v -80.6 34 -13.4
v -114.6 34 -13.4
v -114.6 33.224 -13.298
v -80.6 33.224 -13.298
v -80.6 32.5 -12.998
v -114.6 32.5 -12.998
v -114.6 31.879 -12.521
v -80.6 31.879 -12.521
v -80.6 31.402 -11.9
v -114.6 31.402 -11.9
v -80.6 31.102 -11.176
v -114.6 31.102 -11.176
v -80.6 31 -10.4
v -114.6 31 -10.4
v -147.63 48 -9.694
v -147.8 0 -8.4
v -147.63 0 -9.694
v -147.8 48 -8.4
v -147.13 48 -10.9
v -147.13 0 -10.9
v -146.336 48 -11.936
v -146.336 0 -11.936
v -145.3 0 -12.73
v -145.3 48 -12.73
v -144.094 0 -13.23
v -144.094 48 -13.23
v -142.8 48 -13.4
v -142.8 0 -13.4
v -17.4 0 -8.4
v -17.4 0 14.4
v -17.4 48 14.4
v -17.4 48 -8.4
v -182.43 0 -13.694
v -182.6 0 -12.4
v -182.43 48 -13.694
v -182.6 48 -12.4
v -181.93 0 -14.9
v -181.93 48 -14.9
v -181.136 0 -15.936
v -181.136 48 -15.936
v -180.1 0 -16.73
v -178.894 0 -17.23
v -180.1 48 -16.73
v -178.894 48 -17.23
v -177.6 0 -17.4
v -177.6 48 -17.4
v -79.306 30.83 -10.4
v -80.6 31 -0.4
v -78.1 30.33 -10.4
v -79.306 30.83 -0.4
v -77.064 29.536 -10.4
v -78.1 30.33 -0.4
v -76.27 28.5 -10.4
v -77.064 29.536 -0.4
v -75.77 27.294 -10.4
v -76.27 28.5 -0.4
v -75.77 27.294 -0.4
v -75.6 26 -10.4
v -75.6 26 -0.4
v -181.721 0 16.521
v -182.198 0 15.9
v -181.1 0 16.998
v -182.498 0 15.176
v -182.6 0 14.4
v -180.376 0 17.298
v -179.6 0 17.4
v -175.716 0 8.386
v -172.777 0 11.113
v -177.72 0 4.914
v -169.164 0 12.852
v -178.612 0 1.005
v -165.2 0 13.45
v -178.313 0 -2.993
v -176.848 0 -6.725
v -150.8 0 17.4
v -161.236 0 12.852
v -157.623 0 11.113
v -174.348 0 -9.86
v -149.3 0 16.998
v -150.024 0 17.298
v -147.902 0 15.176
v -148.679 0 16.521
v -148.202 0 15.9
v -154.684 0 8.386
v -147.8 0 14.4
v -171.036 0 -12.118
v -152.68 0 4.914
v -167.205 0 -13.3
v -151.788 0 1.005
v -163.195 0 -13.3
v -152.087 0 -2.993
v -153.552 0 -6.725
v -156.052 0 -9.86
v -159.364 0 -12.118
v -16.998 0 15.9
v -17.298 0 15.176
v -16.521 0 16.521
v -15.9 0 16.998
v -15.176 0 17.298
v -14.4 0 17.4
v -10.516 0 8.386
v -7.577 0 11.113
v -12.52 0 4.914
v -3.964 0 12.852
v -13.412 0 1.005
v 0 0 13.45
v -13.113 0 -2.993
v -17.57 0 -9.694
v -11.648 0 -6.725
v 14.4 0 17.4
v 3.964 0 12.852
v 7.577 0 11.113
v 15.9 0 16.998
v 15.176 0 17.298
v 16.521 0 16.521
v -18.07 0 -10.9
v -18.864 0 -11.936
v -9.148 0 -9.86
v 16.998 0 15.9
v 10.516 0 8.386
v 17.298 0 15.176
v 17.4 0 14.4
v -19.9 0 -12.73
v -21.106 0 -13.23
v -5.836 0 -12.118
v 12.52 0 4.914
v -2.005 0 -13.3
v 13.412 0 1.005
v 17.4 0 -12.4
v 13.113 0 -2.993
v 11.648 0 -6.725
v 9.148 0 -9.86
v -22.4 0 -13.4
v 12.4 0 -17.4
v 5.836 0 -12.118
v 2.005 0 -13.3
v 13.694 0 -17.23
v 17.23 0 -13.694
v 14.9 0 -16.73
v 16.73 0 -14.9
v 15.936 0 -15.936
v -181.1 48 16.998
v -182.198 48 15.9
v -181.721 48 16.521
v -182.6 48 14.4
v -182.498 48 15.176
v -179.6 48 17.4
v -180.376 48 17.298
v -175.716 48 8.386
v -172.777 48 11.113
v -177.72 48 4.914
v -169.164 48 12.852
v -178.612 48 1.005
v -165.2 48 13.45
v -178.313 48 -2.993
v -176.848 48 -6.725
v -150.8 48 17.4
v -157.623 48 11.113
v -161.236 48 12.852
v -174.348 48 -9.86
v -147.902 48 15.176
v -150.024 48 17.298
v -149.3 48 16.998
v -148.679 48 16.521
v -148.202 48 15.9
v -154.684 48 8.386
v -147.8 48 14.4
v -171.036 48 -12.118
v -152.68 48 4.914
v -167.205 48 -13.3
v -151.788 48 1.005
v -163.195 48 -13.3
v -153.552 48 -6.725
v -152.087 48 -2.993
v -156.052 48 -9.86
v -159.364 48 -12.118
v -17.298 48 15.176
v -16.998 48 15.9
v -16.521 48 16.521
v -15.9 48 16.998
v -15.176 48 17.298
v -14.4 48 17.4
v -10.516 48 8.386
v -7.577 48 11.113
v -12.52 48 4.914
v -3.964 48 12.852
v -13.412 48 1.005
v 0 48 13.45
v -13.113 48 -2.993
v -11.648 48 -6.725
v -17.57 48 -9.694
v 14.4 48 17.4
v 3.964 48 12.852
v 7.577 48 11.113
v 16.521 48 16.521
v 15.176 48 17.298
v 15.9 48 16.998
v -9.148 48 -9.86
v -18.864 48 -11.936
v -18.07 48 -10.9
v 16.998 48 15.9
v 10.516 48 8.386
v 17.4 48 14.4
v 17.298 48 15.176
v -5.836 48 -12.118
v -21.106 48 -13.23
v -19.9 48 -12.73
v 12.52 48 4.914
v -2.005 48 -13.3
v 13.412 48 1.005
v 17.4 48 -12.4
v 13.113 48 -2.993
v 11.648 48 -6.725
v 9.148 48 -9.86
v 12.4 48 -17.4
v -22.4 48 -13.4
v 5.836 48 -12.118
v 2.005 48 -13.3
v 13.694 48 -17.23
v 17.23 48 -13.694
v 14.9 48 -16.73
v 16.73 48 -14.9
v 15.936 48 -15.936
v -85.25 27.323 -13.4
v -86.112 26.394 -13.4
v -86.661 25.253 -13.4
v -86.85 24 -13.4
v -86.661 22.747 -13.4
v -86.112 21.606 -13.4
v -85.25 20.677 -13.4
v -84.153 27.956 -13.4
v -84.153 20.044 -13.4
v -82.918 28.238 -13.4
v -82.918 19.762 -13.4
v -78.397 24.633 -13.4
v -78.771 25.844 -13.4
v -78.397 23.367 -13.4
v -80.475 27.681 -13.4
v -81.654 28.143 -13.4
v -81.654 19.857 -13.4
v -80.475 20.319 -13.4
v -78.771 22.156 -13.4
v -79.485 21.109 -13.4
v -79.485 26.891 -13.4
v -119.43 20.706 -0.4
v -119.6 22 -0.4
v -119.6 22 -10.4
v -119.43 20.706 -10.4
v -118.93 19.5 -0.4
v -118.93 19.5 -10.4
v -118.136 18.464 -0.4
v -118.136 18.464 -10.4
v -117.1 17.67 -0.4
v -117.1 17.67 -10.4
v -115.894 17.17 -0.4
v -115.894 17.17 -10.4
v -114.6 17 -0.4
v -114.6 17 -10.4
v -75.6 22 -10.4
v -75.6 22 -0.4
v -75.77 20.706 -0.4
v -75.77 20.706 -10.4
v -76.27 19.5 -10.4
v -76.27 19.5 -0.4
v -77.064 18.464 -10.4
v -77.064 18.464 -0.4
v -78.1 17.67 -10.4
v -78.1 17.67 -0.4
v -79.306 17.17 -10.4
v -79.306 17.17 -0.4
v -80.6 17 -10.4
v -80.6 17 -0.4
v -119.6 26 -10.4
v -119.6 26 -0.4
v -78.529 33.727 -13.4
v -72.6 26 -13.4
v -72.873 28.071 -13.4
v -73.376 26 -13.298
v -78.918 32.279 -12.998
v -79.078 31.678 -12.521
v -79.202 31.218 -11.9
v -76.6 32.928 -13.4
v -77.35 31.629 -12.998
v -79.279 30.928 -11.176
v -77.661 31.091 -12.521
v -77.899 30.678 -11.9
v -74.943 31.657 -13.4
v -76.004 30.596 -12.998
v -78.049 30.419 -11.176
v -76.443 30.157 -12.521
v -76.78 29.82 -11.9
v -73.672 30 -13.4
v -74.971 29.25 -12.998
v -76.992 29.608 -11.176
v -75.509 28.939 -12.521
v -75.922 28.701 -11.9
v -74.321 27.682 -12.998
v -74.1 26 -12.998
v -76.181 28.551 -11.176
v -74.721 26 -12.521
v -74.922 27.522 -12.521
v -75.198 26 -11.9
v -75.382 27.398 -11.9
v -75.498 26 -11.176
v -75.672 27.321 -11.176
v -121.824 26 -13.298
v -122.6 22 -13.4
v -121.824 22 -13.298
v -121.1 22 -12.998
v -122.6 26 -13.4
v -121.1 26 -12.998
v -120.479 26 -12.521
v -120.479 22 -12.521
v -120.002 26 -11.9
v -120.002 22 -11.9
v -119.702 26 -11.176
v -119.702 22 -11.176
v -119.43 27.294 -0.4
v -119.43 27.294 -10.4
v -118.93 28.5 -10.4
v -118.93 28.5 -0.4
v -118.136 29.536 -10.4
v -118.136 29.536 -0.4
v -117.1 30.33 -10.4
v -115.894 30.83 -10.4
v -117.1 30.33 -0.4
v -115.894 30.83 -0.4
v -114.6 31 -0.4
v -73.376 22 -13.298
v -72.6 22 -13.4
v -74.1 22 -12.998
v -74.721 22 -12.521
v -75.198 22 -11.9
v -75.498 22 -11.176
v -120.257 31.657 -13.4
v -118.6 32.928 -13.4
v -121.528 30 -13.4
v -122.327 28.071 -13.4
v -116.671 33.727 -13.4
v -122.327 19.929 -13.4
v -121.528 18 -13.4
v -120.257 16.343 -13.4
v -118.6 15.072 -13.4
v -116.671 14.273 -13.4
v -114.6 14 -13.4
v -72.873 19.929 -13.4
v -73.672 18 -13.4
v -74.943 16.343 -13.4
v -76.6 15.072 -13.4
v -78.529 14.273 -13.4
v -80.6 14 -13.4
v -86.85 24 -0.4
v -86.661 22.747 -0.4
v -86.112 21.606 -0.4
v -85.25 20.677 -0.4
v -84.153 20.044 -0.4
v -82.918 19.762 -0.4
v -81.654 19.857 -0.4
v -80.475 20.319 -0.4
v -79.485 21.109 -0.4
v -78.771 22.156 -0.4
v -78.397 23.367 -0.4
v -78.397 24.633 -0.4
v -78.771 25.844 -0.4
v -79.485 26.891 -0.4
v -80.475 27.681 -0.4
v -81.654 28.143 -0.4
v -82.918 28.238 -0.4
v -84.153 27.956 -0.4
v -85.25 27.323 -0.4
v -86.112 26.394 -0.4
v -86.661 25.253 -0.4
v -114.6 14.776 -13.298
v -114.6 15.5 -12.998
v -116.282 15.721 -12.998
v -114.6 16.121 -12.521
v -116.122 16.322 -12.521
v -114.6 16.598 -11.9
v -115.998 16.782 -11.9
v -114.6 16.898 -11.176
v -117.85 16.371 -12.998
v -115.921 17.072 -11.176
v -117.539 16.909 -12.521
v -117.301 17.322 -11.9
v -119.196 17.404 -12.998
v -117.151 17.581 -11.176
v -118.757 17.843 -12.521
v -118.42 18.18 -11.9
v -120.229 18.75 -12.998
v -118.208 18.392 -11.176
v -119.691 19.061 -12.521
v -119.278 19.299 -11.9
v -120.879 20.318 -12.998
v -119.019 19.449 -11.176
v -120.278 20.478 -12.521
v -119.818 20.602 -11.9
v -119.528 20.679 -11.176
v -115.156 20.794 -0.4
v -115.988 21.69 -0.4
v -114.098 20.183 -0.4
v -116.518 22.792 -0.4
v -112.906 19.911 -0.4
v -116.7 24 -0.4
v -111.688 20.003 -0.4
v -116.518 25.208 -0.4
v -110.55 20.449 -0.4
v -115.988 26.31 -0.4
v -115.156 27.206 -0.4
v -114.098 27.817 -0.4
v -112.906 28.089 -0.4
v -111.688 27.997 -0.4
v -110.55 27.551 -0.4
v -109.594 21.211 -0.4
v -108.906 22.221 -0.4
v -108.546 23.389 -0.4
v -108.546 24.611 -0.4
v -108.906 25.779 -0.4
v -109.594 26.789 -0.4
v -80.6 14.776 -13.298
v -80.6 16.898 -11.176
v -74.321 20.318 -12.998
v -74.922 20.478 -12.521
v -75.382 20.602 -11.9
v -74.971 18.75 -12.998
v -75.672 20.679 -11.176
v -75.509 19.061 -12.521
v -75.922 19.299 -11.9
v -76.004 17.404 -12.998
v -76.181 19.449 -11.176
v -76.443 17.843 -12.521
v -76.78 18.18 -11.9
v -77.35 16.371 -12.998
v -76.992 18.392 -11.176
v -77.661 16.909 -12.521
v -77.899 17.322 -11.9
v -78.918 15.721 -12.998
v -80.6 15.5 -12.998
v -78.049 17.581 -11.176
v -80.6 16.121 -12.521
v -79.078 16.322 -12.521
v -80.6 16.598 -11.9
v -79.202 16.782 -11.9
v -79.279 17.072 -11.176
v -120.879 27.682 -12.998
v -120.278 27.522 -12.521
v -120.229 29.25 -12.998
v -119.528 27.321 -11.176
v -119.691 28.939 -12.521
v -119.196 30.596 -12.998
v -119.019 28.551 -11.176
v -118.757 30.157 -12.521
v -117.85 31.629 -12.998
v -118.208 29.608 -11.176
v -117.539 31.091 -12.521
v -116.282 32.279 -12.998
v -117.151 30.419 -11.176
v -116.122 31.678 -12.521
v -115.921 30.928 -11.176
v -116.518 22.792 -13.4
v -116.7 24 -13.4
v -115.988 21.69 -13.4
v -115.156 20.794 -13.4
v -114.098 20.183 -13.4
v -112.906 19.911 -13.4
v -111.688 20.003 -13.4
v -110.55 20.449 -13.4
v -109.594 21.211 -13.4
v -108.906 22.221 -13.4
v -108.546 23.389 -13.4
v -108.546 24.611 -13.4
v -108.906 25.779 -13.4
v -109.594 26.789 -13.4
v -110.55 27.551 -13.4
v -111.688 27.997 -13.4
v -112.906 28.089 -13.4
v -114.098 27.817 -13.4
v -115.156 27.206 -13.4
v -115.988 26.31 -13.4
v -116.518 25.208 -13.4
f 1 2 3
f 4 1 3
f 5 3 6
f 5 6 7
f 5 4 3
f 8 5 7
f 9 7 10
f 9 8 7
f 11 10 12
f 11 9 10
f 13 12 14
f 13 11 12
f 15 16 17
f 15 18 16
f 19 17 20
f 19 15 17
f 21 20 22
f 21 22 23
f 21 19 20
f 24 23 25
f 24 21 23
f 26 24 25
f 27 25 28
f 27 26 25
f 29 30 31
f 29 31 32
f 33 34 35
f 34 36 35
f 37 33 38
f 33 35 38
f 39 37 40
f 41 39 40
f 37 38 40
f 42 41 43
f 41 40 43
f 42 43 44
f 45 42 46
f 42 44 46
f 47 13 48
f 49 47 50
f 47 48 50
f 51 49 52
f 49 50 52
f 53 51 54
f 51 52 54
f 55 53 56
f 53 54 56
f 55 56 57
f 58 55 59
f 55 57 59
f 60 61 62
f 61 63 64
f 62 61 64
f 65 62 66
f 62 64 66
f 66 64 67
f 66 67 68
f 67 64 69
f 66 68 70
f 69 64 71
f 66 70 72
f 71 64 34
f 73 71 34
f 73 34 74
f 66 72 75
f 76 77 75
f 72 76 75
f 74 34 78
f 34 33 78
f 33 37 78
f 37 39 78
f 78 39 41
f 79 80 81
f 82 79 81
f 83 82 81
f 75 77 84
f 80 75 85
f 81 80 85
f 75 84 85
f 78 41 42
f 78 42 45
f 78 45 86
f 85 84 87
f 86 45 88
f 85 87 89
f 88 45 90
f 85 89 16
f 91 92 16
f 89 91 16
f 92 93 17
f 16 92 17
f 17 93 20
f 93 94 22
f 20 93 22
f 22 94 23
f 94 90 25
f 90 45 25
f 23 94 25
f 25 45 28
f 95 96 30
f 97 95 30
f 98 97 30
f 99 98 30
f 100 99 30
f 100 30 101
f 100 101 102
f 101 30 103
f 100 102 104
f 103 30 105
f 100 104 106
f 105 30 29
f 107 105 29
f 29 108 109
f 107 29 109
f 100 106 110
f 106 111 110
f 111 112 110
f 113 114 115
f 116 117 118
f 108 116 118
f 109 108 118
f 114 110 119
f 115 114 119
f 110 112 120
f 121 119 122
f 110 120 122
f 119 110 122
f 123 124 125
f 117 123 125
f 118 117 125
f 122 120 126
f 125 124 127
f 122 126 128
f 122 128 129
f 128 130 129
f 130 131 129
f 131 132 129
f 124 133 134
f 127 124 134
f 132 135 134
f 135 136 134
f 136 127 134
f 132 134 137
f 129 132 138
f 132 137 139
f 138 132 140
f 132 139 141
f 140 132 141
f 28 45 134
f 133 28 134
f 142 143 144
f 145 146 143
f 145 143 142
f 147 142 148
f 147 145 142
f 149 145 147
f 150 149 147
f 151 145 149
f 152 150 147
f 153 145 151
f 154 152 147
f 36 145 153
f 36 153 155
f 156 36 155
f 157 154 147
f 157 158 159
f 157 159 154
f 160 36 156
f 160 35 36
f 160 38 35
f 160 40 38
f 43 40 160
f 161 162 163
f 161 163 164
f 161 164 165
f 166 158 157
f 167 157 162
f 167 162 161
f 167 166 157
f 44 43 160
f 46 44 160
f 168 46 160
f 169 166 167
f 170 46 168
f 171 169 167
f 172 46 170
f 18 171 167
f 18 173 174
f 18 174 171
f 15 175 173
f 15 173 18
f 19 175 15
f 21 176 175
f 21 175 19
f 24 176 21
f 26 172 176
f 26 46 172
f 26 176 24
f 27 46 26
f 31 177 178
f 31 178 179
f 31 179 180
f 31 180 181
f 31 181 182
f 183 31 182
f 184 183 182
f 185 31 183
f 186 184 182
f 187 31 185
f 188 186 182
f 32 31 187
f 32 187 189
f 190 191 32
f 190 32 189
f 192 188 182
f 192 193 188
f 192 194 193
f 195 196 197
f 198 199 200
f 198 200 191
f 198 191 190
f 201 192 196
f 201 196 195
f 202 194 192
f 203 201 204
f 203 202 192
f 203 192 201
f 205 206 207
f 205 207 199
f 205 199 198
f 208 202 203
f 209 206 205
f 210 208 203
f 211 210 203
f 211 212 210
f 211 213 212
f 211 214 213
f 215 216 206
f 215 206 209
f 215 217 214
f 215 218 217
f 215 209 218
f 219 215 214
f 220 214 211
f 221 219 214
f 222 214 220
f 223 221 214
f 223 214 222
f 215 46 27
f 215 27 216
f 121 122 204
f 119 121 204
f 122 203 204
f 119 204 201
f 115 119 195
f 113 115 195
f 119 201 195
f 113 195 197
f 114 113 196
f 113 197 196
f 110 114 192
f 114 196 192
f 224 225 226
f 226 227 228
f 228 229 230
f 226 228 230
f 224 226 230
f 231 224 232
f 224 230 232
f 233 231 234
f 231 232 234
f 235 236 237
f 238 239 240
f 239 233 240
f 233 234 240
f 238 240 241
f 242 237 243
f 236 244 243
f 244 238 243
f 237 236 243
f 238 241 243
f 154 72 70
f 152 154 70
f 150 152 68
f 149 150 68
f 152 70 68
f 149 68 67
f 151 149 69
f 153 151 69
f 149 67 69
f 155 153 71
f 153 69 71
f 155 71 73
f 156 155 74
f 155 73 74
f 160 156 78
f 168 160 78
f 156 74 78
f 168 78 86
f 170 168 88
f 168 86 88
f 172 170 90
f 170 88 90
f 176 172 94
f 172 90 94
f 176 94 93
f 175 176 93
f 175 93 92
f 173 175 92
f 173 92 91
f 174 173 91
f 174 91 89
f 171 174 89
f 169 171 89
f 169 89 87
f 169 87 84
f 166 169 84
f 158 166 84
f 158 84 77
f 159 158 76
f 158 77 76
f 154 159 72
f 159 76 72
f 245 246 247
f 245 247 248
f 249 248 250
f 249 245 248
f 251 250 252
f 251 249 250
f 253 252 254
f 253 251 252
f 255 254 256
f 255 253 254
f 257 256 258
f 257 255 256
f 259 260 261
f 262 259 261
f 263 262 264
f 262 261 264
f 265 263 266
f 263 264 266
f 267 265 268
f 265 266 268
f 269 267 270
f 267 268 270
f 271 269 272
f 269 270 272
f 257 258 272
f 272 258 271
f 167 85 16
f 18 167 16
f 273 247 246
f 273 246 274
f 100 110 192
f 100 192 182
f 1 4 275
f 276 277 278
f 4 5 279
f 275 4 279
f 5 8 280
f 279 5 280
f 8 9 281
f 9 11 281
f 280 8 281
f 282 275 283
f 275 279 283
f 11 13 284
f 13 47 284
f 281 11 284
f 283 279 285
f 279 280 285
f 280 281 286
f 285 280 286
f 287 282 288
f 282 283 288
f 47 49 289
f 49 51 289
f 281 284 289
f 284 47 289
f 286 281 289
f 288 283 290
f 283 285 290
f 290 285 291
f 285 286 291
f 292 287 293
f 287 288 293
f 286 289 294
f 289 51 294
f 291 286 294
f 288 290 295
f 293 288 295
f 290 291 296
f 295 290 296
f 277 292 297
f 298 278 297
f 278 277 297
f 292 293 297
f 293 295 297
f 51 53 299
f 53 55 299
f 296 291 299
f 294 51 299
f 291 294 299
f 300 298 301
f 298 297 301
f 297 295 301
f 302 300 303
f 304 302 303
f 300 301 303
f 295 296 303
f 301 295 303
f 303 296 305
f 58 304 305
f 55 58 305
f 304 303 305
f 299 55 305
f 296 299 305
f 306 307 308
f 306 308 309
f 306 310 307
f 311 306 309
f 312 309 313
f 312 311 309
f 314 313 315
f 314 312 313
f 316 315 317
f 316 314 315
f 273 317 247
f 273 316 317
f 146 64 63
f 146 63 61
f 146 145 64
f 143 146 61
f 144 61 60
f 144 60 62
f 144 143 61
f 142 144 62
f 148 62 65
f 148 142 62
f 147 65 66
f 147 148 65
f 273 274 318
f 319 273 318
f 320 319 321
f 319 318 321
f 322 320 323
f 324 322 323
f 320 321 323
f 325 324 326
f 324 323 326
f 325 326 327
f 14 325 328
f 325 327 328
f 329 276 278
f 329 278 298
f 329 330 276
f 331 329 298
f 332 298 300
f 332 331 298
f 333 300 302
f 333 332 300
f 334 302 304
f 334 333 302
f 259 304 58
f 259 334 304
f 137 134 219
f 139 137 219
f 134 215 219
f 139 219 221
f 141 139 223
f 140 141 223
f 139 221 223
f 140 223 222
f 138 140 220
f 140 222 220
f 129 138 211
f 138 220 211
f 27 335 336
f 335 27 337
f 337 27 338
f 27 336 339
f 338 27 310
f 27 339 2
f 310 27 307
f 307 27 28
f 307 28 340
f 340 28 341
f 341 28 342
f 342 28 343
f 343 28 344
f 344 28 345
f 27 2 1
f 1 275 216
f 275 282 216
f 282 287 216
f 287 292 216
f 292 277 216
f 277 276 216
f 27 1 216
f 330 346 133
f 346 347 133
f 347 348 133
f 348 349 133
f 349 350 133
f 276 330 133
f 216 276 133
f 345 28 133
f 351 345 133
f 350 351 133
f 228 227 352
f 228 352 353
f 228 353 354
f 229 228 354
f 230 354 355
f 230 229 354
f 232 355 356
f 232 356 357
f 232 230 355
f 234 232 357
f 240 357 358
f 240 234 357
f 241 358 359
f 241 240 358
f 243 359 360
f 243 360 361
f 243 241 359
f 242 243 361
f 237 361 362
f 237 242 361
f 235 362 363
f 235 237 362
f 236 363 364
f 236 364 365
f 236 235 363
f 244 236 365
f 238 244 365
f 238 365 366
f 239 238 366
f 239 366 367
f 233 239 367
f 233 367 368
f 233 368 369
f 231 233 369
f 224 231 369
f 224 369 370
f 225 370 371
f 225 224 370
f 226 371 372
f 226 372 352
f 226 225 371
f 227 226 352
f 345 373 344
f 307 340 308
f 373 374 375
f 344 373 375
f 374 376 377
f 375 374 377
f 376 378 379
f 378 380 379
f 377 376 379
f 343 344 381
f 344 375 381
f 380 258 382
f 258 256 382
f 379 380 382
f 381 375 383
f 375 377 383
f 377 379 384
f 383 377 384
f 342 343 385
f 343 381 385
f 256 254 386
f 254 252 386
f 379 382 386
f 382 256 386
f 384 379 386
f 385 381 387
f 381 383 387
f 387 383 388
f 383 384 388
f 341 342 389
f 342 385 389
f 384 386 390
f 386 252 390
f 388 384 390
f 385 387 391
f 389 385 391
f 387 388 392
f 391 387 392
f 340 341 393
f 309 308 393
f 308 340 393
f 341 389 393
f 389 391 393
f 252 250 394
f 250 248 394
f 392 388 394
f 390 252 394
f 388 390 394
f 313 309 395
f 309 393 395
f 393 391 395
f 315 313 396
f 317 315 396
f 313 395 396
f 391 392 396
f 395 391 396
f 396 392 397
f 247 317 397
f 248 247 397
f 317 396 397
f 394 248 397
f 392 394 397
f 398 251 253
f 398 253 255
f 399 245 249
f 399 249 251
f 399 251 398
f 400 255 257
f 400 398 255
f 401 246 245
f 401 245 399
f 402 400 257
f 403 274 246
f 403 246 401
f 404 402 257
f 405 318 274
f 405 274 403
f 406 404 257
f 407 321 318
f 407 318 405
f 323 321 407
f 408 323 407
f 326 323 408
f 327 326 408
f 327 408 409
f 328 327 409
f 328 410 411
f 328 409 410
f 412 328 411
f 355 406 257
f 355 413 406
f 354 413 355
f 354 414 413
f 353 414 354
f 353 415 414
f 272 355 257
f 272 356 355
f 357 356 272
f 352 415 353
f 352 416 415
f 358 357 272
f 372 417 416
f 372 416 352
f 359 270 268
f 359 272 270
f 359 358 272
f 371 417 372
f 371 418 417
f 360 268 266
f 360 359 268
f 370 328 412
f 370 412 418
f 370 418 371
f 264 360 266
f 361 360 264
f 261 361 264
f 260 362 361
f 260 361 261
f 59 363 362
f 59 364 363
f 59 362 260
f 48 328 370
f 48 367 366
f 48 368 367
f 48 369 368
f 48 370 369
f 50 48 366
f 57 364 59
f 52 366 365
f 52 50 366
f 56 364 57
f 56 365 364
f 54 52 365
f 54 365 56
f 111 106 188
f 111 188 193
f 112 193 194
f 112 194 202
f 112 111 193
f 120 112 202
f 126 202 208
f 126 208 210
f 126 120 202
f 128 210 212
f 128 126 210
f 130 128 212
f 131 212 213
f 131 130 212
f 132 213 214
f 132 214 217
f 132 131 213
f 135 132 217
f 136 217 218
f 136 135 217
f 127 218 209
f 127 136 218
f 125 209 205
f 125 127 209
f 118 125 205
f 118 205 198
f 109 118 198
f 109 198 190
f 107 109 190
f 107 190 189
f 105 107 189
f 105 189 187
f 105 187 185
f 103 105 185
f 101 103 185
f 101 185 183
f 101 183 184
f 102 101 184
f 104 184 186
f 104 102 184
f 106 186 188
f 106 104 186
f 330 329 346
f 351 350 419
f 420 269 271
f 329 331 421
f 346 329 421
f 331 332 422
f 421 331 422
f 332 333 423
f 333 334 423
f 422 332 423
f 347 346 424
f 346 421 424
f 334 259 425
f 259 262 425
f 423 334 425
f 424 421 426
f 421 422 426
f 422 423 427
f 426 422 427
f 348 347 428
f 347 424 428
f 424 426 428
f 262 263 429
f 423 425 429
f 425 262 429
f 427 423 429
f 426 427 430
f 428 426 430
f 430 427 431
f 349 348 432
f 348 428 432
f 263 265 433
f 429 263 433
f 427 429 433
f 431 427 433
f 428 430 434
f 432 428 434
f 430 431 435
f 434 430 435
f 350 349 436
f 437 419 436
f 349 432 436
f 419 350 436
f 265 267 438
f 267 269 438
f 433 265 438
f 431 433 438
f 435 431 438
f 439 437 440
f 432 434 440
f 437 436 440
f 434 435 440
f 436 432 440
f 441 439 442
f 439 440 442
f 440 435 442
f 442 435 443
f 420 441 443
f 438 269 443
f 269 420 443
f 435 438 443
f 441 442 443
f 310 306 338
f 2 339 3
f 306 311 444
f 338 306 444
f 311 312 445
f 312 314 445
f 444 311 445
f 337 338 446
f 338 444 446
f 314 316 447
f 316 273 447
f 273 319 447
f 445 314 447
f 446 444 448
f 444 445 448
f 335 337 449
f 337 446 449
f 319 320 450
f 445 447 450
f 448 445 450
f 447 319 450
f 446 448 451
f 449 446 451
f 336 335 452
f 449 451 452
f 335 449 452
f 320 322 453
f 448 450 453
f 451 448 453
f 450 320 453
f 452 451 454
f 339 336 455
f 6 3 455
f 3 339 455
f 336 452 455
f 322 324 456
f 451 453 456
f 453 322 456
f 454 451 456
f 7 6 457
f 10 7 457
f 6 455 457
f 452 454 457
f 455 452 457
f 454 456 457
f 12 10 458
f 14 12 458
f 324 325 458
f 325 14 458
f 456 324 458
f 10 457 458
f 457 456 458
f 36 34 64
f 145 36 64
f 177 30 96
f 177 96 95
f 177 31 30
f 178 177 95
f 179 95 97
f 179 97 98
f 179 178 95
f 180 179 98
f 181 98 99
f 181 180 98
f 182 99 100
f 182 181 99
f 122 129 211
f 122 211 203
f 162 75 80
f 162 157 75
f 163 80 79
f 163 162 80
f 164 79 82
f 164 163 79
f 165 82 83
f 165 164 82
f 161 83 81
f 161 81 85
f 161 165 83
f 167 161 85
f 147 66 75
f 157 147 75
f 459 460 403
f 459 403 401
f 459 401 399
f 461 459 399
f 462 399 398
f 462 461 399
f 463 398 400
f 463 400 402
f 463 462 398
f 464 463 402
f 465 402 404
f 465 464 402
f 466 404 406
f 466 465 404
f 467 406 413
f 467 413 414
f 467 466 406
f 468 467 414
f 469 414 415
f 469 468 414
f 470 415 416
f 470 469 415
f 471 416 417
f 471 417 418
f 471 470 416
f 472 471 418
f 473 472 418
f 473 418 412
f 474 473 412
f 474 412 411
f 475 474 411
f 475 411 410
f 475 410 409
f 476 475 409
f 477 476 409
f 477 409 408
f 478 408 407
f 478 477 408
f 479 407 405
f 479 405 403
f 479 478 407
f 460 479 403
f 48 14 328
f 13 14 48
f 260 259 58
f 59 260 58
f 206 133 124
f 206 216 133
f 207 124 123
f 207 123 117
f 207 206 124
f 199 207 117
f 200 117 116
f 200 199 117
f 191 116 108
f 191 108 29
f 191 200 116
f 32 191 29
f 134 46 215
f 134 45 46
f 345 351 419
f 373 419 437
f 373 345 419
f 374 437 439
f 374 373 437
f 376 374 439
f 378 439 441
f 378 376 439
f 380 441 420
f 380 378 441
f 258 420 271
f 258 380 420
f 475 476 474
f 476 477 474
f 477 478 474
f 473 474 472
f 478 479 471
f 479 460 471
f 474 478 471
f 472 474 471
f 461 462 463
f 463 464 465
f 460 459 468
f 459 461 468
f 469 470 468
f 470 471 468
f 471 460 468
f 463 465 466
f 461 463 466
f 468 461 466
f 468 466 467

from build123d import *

# Parameters (mm, degrees)
SKETCH1_R           = 13.45
BOSS_EXTRUDE2_DEPTH = 48
SKETCH7_W           = 44
SKETCH7_H           = 14
SKETCH7_R           = 4.25
SKETCH7_R_2         = 4.1
BOSS_EXTRUDE3_DEPTH = 13
FILLET1_R           = 3
FILLET2_R           = 5
FILLET3_R           = 5
FILLET4_R           = 3


with BuildPart() as part:
    # Sketch1 → Boss-Extrude2 (new body)
    with BuildSketch(Plane(origin=(0, 0, 0), x_dir=(1, 0, 0), z_dir=(0, 1, 0))):
        Polygon((-17.4, 17.4), (17.4, 17.4), (17.4, -17.4), (-17.4, -17.4), (-17.4, 13.4), (-82.6, 13.4), (-82.6, 17.4), align=None)
        with Locations(Location((0, 0, 0), (0, 0, 270))):
            Circle(SKETCH1_R, mode=Mode.SUBTRACT)
    boss_extrude2 = extrude(amount=BOSS_EXTRUDE2_DEPTH)

    # Mirror2: Boss-Extrude2 across plane
    add(boss_extrude2.mirror(Plane(origin=(-82.6, 48, -17.4), x_dir=(0, 0, 1), z_dir=(1, 0, 0))))

    # Sketch7 → Boss-Extrude3 (add)
    with BuildSketch(Plane.XY.offset(-13.4)):
        with Locations((-97.6, 24)):
            Rectangle(SKETCH7_W, SKETCH7_H)
        with Locations(Location((-82.6, 24, 0), (0, 0, 180))):
            Circle(SKETCH7_R, mode=Mode.SUBTRACT)
        with Locations(Location((-112.6, 24, 0), (0, 0, 180))):
            Circle(SKETCH7_R_2, mode=Mode.SUBTRACT)
    extrude(amount=BOSS_EXTRUDE3_DEPTH)

    # Fillet1
    fillet1_edges = [part.edges().sort_by_distance(p)[0] for p in [
        (17.4, 24, 17.4),
        (-17.4, 24, 17.4),
        (-182.6, 24, 17.4),
        (-147.8, 24, 17.4),
    ]]
    fillet(fillet1_edges, radius=FILLET1_R)

    # Fillet2
    fillet2_edges = [part.edges().sort_by_distance(p)[0] for p in [
        (-17.4, 24, -13.4),
        (17.4, 24, -17.4),
        (-182.6, 24, -17.4),
        (-147.8, 24, -13.4),
    ]]
    fillet(fillet2_edges, radius=FILLET2_R)

    # Fillet3
    fillet3_edges = [part.edges().sort_by_distance(p)[0] for p in [
        (-75.6, 17, -6.9),
        (-75.6, 31, -6.9),
        (-119.6, 31, -6.9),
        (-119.6, 17, -6.9),
    ]]
    fillet(fillet3_edges, radius=FILLET3_R)

    # Fillet4
    fillet4_edges = [part.edges().sort_by_distance(p)[0] for p in [
        (-97.6, 31, -13.4),
        (-75.6, 24, -13.4),
        (-97.6, 17, -13.4),
        (-119.6, 24, -13.4),
        (-77.064466094, 29.535533906, -13.4),
        (-77.064466094, 18.464466094, -13.4),
        (-118.135533906, 29.535533906, -13.4),
        (-118.135533906, 18.464466094, -13.4),
    ]]
    fillet(fillet4_edges, radius=FILLET4_R)


solid = part.part
